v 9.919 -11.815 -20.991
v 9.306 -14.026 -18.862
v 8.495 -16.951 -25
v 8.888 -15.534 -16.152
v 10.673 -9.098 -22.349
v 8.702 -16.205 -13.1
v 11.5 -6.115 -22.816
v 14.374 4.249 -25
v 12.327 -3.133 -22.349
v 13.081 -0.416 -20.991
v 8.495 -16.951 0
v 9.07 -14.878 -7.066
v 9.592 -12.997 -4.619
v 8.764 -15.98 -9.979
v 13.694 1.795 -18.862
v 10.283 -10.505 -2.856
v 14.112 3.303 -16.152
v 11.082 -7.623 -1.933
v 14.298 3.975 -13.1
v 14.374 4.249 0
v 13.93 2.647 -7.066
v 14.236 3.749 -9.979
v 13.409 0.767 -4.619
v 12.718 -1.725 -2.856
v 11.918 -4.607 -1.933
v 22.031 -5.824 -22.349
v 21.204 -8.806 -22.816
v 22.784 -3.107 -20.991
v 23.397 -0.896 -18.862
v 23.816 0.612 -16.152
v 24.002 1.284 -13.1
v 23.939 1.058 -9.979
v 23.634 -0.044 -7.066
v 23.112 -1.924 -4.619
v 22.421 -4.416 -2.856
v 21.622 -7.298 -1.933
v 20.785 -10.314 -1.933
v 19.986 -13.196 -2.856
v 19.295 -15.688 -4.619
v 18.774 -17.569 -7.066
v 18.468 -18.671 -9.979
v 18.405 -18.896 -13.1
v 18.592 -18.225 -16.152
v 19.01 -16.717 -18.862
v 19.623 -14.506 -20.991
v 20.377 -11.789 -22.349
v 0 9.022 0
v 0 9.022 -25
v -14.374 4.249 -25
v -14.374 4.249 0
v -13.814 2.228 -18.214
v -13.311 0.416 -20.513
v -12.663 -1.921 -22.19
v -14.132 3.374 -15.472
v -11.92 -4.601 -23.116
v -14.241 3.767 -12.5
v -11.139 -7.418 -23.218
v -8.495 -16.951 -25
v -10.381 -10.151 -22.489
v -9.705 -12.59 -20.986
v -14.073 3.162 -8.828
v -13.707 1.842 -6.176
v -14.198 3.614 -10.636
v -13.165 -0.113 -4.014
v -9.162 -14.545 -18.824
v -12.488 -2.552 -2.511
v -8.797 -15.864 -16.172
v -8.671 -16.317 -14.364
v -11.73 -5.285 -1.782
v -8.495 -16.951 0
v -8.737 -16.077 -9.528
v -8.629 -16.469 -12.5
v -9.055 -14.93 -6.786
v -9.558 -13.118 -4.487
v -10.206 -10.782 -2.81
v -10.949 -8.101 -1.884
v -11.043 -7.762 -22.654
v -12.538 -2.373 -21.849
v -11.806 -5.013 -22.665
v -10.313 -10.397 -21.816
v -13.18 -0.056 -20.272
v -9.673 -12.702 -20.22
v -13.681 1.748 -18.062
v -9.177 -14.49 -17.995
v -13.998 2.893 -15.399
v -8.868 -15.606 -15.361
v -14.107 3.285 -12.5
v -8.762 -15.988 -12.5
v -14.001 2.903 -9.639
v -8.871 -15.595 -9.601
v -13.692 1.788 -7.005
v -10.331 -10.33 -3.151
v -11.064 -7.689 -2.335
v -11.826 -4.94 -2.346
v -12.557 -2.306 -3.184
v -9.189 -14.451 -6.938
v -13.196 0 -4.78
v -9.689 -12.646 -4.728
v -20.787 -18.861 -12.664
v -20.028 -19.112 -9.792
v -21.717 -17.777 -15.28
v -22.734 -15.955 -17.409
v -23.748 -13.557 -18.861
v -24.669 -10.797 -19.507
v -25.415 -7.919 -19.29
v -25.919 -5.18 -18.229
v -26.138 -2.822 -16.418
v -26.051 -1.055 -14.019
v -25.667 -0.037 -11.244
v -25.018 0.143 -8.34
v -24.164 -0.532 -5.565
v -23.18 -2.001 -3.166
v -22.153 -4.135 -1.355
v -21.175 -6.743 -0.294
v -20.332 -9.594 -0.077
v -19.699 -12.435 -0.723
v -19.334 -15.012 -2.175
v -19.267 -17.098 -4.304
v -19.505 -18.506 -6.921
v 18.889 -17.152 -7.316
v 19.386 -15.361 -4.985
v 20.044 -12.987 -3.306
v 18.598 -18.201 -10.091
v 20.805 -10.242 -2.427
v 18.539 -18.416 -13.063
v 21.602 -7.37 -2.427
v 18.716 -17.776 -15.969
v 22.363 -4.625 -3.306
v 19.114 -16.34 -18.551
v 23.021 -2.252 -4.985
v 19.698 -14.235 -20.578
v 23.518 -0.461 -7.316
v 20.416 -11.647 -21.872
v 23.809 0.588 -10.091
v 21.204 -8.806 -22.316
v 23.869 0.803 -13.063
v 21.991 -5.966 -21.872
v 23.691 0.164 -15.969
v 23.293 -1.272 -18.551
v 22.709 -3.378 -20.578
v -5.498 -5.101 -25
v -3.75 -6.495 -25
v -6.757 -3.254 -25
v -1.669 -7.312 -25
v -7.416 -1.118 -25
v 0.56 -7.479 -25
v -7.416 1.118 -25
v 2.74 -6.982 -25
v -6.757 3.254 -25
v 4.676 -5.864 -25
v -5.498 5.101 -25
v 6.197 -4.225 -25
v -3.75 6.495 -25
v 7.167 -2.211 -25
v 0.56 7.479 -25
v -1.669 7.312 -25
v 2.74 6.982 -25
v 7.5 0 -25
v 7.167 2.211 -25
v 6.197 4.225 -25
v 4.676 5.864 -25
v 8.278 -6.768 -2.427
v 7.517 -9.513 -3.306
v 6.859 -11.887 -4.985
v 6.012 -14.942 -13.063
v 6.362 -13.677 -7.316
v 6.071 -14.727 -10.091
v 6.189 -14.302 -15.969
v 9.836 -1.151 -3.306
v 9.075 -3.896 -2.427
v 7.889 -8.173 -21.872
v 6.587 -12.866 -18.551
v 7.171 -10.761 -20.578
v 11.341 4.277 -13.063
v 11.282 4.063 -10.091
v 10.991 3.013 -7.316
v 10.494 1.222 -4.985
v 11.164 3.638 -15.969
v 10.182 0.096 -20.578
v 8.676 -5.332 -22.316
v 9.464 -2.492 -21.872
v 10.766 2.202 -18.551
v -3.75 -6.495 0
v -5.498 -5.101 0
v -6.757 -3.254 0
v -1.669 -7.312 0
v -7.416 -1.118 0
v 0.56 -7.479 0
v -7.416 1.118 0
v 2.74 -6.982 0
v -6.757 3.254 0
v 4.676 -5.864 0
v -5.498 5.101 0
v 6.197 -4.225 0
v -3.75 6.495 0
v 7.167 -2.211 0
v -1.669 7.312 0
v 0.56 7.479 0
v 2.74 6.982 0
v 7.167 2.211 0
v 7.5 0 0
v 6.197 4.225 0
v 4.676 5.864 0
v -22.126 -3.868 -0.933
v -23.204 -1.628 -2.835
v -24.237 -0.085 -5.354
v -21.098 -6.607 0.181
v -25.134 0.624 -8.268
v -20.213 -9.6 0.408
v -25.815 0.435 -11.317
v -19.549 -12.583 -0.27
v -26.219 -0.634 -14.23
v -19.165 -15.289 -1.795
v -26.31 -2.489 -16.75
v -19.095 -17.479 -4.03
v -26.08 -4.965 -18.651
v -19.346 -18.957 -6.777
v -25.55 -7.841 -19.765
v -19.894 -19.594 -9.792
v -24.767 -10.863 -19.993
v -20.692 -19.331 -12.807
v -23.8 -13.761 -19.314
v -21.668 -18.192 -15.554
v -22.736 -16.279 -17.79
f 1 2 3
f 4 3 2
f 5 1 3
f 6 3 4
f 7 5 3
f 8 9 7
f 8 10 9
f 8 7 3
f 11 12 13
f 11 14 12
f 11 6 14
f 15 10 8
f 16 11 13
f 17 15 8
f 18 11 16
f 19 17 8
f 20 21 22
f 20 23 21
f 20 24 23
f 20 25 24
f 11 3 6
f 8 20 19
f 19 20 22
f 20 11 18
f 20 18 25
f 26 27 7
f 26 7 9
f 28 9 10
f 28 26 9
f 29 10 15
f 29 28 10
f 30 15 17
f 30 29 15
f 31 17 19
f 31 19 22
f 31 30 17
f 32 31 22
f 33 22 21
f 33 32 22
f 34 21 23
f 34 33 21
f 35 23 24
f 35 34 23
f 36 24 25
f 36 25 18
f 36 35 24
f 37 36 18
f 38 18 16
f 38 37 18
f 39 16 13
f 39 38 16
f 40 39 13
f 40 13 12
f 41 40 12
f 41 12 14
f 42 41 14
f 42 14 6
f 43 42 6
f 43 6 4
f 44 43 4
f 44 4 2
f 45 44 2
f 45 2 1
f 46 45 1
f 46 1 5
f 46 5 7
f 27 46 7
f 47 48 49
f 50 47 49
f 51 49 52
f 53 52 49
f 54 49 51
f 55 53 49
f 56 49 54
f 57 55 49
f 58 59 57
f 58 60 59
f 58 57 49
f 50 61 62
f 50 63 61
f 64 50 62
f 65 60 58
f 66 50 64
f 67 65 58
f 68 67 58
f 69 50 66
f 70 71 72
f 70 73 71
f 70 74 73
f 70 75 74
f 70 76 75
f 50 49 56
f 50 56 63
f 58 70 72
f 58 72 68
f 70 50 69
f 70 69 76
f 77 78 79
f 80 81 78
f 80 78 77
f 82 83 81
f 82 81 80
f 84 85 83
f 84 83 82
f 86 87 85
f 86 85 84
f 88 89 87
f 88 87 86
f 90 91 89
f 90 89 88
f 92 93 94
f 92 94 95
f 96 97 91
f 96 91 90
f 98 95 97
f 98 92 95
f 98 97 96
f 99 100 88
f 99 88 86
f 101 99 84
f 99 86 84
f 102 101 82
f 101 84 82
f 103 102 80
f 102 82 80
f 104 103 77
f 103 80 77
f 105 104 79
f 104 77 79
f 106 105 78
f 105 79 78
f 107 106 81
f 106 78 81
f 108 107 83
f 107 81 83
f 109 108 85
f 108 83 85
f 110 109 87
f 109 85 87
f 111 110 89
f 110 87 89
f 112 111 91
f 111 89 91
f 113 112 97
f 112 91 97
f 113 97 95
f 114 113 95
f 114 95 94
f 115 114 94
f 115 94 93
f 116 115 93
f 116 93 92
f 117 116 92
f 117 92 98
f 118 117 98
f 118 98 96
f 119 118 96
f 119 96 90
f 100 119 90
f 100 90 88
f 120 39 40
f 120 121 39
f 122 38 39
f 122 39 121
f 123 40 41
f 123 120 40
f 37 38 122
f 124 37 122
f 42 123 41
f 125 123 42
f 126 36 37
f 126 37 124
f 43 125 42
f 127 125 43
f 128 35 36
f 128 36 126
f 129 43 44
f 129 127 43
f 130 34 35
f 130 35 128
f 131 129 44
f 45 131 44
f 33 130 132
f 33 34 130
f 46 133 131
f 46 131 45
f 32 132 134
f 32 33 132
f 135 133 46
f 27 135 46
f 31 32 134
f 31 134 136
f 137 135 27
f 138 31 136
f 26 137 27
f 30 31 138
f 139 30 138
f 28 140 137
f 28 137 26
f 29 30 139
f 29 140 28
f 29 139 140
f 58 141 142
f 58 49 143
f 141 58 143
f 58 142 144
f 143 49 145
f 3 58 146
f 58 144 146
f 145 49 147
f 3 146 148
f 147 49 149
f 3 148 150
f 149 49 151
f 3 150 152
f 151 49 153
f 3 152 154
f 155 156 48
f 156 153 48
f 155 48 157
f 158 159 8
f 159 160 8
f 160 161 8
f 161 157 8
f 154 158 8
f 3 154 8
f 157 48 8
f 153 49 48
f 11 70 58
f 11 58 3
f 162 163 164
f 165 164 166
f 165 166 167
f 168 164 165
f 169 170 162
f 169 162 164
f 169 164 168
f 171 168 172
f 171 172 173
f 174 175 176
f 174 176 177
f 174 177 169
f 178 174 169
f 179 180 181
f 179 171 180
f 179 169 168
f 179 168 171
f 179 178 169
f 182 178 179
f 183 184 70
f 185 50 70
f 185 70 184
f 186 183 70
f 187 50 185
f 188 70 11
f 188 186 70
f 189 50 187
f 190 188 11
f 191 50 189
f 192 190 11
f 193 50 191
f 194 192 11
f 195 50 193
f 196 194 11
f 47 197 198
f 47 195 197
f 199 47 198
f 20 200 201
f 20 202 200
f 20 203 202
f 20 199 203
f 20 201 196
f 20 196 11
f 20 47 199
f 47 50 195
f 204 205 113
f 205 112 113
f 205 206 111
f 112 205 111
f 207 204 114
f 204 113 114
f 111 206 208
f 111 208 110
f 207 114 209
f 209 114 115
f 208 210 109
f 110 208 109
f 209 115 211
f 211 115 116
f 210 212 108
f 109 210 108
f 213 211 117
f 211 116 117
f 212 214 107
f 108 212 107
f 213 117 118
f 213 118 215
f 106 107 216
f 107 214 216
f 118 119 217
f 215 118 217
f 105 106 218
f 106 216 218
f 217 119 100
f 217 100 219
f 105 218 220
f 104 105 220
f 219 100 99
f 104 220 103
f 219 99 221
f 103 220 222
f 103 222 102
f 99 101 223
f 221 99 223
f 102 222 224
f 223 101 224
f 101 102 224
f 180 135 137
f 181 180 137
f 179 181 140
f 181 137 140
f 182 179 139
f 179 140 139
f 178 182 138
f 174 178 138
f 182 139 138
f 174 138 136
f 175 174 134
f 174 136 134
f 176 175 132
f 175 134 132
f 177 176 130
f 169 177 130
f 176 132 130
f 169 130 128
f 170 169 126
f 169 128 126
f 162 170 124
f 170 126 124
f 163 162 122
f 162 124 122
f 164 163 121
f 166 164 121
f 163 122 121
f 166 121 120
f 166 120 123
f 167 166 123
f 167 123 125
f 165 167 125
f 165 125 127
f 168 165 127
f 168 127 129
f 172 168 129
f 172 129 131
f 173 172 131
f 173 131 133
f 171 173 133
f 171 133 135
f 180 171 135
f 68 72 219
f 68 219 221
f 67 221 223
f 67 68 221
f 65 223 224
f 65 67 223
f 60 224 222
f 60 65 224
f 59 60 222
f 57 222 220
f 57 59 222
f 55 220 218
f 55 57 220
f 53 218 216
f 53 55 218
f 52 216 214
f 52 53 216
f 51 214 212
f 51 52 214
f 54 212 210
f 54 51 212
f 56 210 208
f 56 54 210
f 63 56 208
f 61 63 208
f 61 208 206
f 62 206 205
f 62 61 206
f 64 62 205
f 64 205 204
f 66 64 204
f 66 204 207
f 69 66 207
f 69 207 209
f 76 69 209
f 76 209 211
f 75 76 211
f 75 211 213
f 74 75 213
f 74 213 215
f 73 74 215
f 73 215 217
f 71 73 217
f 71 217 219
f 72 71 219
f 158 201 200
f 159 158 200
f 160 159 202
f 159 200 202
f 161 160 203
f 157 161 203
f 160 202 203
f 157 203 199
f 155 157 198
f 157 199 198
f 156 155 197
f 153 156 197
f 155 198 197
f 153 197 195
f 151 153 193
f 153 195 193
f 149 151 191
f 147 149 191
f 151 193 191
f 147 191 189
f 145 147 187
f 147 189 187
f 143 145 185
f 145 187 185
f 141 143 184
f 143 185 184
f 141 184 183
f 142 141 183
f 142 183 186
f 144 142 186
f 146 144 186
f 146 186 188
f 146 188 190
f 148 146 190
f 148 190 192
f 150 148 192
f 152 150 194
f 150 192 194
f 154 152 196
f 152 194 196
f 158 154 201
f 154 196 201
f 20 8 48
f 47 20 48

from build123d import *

# Parameters (mm, degrees)
SKETCH2_R                = 7.5
BOSS_EXTRUDE1_DEPTH      = 25
SKETCH14_R               = 10.5
SKETCH14_R_2             = 10
EXTRUDE_THIN3_DEPTH      = 3
EXTRUDE_THIN3_DEPTH_BACK = 12
SKETCH8_R                = 10
CUT_EXTRUDE4_DEPTH       = 13
SKETCH12_R               = 10.5
SKETCH12_R_2             = 10
EXTRUDE_THIN2_DEPTH      = 12


with BuildPart() as part:
    # Sketch2 → Boss-Extrude1 (new body)
    with BuildSketch(Plane.XY):
        Polygon((0, 9.022413356), (-14.374271139, 4.248669099), (-8.495026865, -16.951200871), (8.495026865, -16.951200871), (14.374271139, 4.248669099), align=None)
        Circle(SKETCH2_R, mode=Mode.SUBTRACT)
    extrude(amount=-BOSS_EXTRUDE1_DEPTH)

    # Sketch14 → Extrude-Thin3 (add, two sides)
    with BuildSketch(Plane(origin=(-8.98162527, -2.490825133, 2.158943025), x_dir=(0.267238376, -0.963630453, 0), z_dir=(0.938775452, 0.260345474, -0.225656566))) as extrude_thin3_sk:
        with Locations((3.064496194, 15.047052931)):
            Circle(SKETCH14_R)
        with Locations((3.064496194, 15.047052931)):
            Circle(SKETCH14_R_2, mode=Mode.SUBTRACT)
    extrude(amount=EXTRUDE_THIN3_DEPTH)
    extrude(extrude_thin3_sk.sketch, amount=-EXTRUDE_THIN3_DEPTH_BACK)

    # Sketch8 → Cut-Extrude4 (cut)
    with BuildSketch(Plane(origin=(21.957149201, -6.089256391, 0), x_dir=(0, 0, -1), z_dir=(0.963630453, -0.267238376, 0))):
        with Locations((12.31580825, -2.819568794)):
            Circle(SKETCH8_R)
    extrude(amount=-CUT_EXTRUDE4_DEPTH, mode=Mode.SUBTRACT)

    # Sketch12 → Extrude-Thin2 (add)
    with BuildSketch(Plane(origin=(21.957149201, -6.089256391, 0), x_dir=(0, 0, -1), z_dir=(0.963630453, -0.267238376, 0))):
        with Locations((12.31580825, -2.819568794)):
            Circle(SKETCH12_R)
        with Locations((12.31580825, -2.819568794)):
            Circle(SKETCH12_R_2, mode=Mode.SUBTRACT)
    extrude(amount=-EXTRUDE_THIN2_DEPTH)


solid = part.part
